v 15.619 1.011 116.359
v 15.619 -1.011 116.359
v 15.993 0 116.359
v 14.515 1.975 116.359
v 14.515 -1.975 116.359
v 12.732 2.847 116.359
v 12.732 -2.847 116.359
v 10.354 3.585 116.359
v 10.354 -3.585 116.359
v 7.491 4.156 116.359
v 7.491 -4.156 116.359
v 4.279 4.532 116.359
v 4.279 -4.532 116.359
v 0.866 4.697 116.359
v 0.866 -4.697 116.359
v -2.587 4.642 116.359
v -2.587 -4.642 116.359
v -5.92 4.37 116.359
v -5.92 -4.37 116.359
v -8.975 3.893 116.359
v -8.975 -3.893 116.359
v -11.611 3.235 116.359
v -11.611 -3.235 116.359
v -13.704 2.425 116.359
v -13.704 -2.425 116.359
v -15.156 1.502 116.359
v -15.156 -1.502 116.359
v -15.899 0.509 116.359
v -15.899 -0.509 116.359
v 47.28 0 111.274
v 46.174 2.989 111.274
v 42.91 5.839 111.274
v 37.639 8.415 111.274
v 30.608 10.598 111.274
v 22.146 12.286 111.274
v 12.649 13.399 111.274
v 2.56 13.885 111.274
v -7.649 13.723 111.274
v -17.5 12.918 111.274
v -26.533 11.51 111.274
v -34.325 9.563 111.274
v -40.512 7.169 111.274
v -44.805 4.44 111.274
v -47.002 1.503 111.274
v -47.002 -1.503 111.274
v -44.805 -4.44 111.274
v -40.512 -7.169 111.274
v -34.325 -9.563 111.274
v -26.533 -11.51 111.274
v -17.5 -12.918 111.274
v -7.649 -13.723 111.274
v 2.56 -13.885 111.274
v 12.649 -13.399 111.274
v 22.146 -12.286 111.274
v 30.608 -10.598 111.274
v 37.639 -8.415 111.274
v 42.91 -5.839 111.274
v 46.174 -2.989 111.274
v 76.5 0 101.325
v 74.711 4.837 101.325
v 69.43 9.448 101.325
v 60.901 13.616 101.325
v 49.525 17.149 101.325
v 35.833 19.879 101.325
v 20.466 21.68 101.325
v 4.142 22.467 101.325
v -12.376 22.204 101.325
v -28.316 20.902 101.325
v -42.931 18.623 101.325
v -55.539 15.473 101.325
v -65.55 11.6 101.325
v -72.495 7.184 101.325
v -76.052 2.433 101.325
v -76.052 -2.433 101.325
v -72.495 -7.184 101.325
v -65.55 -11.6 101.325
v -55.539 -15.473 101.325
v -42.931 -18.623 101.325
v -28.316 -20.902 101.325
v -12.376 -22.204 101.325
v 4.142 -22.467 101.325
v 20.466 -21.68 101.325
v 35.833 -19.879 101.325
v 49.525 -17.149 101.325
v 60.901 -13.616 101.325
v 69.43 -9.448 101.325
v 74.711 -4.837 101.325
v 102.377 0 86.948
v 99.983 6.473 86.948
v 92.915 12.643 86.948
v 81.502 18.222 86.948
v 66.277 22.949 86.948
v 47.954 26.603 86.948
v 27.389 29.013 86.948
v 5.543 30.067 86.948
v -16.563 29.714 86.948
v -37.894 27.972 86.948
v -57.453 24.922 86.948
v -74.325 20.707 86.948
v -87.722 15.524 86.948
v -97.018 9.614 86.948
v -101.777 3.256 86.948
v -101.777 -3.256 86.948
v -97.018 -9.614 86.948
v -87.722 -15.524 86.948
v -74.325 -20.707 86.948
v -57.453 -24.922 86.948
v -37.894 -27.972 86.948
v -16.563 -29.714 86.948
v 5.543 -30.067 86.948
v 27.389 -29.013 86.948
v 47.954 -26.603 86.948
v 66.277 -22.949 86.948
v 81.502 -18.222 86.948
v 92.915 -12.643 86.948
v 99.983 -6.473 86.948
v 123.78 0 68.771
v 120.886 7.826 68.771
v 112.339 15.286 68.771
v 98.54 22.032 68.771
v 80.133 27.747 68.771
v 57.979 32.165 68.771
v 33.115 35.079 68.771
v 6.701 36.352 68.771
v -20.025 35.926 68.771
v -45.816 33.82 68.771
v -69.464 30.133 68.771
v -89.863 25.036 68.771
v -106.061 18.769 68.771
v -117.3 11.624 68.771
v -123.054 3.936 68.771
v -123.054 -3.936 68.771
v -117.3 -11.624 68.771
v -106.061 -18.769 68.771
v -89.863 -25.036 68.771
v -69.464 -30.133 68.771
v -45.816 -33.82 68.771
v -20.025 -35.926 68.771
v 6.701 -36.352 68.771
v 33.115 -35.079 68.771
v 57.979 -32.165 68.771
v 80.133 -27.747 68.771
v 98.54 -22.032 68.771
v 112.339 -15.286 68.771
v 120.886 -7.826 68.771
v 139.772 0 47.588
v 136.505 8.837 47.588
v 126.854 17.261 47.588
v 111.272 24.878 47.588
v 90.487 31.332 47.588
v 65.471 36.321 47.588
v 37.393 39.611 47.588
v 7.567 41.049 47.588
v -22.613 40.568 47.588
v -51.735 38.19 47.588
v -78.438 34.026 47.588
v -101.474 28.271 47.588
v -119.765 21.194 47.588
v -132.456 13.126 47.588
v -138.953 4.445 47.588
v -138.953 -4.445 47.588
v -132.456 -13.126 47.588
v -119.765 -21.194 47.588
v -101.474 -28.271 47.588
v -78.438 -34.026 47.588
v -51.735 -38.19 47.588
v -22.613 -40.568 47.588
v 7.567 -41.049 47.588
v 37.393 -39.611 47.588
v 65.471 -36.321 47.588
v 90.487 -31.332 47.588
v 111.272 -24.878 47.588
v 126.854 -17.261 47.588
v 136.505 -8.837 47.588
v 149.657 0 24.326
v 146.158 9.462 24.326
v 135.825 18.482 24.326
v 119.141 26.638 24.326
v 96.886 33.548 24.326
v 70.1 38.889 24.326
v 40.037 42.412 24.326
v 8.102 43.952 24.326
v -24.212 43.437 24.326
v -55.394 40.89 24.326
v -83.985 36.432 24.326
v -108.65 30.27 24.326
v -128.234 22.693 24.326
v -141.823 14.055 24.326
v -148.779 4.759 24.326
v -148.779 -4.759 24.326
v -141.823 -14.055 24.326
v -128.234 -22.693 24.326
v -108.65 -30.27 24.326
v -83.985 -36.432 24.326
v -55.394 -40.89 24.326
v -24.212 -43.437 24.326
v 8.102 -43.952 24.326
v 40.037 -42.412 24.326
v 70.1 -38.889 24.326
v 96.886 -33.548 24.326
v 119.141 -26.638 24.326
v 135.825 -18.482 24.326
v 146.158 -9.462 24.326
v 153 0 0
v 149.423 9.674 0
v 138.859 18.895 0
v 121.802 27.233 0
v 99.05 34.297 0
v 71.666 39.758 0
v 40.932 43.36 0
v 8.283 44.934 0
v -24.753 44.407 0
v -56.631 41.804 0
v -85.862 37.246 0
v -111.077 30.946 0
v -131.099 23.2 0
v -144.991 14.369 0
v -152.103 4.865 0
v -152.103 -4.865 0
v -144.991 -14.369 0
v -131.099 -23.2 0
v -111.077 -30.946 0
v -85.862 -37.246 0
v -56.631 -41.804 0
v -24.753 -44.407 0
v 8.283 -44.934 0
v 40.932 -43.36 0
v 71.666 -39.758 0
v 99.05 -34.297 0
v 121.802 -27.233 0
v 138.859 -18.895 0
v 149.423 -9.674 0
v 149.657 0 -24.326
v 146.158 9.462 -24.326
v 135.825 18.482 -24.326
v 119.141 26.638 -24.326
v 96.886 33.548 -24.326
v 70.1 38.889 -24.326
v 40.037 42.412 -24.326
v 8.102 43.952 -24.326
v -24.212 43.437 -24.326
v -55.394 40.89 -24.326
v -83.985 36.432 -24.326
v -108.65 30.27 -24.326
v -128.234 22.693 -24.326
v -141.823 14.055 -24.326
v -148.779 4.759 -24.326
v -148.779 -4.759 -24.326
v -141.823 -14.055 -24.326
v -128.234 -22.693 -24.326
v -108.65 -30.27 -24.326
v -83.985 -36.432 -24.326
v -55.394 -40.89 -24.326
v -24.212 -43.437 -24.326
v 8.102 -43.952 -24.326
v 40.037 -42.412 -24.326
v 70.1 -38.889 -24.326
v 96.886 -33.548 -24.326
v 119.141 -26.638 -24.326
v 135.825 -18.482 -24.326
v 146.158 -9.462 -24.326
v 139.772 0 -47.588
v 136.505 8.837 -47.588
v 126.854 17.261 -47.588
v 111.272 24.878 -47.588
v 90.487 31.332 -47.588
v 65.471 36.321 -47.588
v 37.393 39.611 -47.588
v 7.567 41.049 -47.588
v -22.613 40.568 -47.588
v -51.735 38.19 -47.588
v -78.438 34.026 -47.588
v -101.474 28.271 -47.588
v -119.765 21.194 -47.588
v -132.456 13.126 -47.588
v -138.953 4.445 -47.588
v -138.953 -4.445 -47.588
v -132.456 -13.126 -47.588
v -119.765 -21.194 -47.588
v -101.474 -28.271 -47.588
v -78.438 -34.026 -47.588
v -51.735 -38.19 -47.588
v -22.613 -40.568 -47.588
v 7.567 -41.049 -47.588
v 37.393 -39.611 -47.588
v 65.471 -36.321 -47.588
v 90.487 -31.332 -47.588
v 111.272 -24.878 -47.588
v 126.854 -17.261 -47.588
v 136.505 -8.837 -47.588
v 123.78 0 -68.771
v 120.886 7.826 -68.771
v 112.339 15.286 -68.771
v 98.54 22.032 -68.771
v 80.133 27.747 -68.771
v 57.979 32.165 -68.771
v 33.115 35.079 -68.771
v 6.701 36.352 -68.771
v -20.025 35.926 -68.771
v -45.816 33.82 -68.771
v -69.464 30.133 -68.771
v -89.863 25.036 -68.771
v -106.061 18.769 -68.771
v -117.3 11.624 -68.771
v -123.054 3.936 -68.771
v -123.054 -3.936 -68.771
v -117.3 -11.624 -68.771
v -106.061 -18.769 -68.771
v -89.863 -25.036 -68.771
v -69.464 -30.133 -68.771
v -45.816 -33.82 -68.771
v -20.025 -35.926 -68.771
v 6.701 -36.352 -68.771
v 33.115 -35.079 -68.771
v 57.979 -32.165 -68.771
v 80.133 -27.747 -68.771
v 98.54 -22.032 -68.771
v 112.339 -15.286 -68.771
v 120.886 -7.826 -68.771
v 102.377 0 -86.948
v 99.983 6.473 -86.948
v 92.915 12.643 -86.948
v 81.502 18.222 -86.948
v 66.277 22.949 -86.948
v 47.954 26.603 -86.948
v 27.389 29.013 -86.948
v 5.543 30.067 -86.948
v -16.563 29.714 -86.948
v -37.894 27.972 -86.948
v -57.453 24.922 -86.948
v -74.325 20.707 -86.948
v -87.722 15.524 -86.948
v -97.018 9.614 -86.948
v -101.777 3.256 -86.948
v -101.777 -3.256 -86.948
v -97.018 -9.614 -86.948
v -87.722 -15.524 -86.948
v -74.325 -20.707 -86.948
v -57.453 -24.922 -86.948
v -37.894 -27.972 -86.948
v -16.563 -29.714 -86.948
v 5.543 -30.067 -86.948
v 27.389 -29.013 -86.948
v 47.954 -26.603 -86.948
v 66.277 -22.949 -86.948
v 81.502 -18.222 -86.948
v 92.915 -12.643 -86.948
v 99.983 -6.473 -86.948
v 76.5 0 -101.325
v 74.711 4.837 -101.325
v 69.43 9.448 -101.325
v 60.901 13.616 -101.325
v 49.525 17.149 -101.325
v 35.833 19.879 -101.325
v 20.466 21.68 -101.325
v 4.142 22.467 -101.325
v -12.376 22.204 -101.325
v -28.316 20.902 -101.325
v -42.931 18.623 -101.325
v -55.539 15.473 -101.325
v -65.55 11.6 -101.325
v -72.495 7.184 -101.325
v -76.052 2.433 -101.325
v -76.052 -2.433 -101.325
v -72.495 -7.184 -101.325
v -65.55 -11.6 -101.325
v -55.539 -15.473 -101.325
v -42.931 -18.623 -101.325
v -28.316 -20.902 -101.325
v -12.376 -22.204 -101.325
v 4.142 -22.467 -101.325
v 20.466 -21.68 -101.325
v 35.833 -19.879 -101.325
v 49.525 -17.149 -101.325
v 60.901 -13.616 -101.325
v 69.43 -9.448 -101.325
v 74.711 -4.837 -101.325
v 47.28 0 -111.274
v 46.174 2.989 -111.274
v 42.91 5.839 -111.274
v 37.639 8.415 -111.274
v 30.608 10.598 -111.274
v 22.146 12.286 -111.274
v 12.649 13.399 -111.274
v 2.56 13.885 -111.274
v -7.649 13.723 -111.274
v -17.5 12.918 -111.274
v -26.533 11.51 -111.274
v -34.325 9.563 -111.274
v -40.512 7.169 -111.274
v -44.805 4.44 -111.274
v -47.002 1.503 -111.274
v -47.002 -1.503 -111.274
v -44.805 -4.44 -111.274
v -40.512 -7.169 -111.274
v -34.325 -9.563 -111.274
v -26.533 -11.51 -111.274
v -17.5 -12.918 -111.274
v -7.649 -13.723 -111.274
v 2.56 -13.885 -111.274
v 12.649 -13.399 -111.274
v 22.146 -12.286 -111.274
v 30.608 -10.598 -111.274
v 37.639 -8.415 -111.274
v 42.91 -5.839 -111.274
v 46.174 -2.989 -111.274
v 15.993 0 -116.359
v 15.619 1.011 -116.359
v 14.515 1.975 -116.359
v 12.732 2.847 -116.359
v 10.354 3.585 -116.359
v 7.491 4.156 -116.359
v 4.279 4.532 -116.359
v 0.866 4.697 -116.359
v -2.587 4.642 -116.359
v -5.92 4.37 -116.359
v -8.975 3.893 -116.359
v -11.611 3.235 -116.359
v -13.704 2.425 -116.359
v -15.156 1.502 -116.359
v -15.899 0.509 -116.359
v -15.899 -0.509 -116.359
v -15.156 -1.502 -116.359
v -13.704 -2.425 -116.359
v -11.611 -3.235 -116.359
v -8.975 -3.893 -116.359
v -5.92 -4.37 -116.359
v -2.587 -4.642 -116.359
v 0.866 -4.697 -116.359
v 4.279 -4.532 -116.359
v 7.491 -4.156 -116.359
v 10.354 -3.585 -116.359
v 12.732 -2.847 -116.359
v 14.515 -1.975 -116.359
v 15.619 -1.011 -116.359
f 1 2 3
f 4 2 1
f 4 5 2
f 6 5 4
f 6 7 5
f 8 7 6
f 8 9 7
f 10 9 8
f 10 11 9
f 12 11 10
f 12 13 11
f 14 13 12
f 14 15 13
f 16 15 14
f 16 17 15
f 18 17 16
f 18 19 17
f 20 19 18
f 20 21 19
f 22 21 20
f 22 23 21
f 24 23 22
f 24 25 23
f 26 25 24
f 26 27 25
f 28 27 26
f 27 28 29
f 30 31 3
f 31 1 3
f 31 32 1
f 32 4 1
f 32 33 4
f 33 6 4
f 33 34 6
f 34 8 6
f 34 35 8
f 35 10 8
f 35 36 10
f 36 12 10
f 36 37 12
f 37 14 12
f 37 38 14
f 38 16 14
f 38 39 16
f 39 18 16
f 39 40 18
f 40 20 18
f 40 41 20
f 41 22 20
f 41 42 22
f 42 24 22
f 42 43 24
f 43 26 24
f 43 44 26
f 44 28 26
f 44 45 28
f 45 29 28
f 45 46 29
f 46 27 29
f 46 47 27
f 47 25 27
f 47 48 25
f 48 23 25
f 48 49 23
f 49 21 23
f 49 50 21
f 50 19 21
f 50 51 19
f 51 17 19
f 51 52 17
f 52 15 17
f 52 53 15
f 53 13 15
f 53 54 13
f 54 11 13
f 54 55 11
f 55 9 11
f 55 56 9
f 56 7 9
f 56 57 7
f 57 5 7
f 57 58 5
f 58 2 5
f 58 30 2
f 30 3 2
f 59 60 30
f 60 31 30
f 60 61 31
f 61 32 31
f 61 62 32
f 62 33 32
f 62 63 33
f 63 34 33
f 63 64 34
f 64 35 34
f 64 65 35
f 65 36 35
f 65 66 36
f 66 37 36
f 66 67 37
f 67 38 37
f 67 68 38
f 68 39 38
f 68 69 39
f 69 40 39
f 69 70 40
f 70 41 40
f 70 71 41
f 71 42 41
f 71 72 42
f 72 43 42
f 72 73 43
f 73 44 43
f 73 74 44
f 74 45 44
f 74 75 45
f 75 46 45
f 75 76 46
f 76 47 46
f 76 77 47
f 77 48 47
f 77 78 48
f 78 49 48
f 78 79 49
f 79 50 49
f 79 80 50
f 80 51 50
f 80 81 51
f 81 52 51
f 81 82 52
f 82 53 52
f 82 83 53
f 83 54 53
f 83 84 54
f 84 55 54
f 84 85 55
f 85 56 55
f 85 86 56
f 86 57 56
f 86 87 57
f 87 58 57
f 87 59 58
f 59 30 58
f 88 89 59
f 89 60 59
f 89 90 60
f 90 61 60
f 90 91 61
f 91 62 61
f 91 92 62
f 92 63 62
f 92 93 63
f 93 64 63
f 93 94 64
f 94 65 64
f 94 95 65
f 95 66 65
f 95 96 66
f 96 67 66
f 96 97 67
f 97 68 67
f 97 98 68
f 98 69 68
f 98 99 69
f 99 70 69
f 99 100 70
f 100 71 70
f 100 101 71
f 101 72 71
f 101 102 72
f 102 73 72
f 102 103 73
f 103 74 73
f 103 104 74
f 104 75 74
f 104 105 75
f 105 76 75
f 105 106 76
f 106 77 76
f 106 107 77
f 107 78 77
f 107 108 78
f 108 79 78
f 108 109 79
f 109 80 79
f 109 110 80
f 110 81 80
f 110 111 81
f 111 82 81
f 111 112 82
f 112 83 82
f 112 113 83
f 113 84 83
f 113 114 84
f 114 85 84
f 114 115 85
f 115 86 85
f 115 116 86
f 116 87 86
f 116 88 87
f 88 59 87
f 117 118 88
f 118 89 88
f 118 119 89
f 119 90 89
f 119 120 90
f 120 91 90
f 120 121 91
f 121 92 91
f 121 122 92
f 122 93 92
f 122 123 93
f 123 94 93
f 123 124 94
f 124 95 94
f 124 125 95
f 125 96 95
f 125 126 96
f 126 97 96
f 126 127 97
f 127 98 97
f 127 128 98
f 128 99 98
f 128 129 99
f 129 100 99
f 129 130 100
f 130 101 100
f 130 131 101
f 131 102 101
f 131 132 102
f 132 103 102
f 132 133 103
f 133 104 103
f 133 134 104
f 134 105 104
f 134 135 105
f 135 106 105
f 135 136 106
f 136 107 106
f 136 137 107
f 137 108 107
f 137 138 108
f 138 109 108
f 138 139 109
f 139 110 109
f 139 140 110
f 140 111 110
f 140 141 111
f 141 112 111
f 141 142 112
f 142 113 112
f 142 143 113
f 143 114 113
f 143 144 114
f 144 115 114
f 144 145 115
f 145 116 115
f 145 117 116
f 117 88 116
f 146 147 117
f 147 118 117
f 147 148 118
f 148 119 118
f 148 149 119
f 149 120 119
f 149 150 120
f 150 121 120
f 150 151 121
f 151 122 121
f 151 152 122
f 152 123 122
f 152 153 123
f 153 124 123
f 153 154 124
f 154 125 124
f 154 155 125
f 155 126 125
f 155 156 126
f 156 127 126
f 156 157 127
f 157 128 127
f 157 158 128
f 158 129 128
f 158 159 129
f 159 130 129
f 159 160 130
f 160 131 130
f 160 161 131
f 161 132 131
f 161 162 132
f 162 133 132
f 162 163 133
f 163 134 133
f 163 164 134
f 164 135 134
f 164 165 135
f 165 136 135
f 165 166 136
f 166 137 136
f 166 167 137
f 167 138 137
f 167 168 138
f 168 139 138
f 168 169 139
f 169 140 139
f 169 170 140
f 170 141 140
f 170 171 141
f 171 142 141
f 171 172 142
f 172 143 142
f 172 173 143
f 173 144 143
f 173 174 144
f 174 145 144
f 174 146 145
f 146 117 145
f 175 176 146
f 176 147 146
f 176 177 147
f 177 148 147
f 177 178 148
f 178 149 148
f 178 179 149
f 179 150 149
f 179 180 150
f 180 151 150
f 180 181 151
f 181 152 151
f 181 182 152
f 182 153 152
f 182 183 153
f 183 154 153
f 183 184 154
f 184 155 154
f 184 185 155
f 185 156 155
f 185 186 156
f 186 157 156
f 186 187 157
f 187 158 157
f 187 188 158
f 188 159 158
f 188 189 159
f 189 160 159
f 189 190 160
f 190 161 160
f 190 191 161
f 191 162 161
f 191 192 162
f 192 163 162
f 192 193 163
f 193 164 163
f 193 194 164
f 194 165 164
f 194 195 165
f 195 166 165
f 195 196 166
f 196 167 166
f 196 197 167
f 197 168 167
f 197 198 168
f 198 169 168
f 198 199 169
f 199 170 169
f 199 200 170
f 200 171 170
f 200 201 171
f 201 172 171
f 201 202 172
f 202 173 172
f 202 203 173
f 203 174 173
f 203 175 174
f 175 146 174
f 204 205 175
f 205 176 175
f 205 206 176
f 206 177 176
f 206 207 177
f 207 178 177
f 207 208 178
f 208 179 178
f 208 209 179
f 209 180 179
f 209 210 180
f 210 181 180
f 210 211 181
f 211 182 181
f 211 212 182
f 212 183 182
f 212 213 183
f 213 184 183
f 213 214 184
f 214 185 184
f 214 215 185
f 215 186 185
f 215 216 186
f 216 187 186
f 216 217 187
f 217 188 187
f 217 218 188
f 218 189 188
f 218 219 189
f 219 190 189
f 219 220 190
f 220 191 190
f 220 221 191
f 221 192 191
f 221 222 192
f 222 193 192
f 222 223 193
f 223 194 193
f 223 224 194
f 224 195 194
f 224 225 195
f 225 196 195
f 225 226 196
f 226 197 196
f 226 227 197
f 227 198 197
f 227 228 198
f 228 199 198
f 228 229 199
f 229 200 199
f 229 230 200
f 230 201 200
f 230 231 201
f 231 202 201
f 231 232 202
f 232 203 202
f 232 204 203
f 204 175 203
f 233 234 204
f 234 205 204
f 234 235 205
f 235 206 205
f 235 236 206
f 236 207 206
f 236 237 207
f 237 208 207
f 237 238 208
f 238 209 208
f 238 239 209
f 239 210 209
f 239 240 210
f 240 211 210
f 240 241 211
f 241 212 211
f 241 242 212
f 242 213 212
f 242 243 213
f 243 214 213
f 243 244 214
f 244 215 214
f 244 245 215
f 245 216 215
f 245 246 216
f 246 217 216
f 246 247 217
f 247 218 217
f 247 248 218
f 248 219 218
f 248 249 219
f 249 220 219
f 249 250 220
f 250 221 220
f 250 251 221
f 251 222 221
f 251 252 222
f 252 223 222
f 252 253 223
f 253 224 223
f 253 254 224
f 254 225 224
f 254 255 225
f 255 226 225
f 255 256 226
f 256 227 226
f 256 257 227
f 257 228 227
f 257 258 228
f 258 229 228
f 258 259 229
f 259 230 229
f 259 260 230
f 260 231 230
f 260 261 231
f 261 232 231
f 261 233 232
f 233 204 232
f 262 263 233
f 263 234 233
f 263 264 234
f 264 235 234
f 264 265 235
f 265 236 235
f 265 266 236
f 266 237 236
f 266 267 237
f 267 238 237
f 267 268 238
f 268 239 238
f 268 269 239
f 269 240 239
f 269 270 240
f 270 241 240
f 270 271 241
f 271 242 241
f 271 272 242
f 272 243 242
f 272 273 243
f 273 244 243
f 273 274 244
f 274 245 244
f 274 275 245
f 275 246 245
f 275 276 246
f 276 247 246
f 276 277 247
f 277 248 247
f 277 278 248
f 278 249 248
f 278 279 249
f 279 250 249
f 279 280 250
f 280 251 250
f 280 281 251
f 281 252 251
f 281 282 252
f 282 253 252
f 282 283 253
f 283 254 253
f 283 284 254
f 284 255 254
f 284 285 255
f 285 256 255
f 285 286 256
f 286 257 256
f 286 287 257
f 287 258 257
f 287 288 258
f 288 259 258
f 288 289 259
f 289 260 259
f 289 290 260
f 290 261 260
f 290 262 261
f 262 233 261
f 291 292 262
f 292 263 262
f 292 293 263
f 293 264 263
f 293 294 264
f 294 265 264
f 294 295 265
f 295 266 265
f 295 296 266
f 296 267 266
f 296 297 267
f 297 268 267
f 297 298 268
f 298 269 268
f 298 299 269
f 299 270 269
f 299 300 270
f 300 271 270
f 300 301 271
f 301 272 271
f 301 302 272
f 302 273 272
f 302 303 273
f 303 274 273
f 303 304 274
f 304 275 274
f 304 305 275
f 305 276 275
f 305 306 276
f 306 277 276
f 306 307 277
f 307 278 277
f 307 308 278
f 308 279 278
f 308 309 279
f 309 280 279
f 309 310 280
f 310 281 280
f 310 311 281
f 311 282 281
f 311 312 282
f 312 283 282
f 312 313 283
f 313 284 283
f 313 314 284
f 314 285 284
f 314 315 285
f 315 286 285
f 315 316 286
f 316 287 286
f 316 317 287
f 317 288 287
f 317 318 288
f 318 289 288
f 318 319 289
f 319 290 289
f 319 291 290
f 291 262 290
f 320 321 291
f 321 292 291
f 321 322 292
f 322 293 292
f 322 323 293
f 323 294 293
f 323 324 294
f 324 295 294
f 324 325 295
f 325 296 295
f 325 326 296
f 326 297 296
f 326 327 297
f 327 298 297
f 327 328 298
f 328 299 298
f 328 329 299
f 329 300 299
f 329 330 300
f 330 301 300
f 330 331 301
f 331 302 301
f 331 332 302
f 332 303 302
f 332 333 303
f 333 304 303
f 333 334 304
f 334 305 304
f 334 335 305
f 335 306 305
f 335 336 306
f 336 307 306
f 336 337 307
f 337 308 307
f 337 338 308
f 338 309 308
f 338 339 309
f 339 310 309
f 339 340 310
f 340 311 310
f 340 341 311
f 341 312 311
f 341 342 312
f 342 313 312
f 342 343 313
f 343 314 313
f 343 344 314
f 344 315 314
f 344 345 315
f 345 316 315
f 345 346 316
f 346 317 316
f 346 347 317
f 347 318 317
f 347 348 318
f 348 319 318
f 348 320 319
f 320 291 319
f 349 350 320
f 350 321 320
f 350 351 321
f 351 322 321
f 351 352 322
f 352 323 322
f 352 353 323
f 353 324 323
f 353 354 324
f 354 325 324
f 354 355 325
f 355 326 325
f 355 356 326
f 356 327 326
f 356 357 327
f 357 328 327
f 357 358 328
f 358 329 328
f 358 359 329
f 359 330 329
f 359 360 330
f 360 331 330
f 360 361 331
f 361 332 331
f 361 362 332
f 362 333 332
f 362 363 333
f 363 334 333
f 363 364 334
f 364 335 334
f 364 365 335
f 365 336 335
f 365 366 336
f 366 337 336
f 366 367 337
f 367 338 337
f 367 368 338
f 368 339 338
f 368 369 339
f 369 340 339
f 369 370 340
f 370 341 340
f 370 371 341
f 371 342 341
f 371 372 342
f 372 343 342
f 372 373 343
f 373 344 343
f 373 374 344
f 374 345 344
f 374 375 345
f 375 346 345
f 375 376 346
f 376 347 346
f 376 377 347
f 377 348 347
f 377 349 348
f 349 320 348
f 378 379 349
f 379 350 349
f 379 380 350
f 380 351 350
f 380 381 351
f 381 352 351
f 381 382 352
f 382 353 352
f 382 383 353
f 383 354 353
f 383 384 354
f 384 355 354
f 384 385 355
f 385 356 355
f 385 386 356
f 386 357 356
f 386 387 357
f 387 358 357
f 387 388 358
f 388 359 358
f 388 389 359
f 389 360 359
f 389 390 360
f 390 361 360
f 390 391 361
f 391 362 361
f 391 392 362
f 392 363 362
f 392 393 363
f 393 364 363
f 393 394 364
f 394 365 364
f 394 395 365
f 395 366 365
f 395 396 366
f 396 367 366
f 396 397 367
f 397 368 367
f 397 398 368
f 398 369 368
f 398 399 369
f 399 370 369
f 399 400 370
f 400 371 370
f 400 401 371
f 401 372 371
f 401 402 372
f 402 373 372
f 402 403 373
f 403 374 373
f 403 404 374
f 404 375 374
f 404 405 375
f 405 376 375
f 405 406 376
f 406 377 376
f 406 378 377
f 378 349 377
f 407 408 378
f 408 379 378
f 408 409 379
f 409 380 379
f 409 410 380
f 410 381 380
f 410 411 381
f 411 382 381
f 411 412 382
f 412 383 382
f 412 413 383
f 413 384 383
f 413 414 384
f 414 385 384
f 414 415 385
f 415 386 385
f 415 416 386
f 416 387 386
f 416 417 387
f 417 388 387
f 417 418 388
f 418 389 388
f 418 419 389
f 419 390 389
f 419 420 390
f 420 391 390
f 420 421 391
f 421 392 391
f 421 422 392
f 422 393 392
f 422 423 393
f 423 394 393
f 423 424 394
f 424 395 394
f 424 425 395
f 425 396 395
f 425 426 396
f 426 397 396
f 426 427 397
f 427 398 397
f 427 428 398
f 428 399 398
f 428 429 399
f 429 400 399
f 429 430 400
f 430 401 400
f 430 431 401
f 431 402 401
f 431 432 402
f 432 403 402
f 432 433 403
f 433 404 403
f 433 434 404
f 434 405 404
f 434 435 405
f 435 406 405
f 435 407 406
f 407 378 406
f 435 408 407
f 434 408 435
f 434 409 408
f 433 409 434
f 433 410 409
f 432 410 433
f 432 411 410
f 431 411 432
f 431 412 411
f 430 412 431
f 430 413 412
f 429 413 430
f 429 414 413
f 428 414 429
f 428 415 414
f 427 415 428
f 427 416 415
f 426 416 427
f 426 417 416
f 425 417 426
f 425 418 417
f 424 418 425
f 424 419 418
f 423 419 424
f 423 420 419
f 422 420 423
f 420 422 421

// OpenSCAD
// Generated by SolidPython 1.0.1 on 2020-07-29 00:46:52


scale(v = [17, 5, 13]) {
	sphere(r = 9);
}
/***********************************************
*********      SolidPython code:      **********
************************************************
 
# import packages: SolidPython
from solid import *
from solid.utils import *
from itertools import chain, combinations, permutations


class Resize:

    def __init__(self, scad_file):
        self.scad_file = scad_file
        #self.scad_file = import_scad(scad_file)
        # cone/cylinder param:
        self.r1 = 0
        self.r2 = 0
        self.h = 0
        # rectangular prism param:
        self.w = 0
        self.l = 0
        # ellipse param:
        self.r = 0

    # import OpenScad code (file name corresponds to shape)


    # classify shape + parameters
    def assign(self, param1, param2, param3):
        if self.scad_file == 'cone.scad':
            self.r1 = param1
            self.r2 = param2
            self.h = param3
        elif self.scad_file == 'cylinder.scad':
            self.r1 = param1
            self.r2 = param2
            self.h = param3
        elif self.scad_file == 'rectangularPrism.scad':
            self.h = param1
            self.l = param2
            self.w = param3
        else:
            self.r = param1
            self.h = param2

    # resize parameters
    def iterate(self):
        x = range(3, 20, 2)
        i = 1
        if self.scad_file == 'cone.scad':
            tempList = list(permutations(x, 2))
            for temp in tempList:
                param1 = temp[0]
                param2 = temp[1]
                filepath = 'produced_scad_files/' + 'cone' + str(param1) + '_' + str(param2) + '_' + '.scad'
                scad_render_to_file(cylinder(h=param1, r1=param2, r2=0), filepath)

        elif self.scad_file == 'cylinder.scad':
            tempList = list(permutations(x, 3))
            for temp in tempList:
                param1 = temp[0]
                param2 = temp[1]
                filepath = 'produced_scad_files/' + 'cylinder' + str(param1) + '_' + str(param2) + '_' + '.scad'
                scad_render_to_file(cylinder(h=param1, r1=param2, r2=param2), filepath)

        elif self.scad_file == 'rectangularPrism.scad':
            tempList = list(permutations(x, 3))
            for temp in tempList:
                param1 = temp[0]
                param2 = temp[1]
                param3 = temp[2]
                filepath = 'produced_scad_files/' + 'rectangularPrism' + str(param1) + '_' + str(param2) + '_' + str(
                    param3) + '.scad'
                scad_render_to_file(cube(size=(param1, param2, param3)), filepath)

        elif self.scad_file == 'ellipse.scad':
            tempList = list(permutations(x, 4))
            for temp in tempList:
                param1 = temp[0]
                param2 = temp[1]
                param3 = temp[2]
                param4 = temp[3]
                filepath = 'produced_scad_files/' + 'ellipse' + str(param1) + '_' + str(param2) + '_' + str(param3) + '_' + str(param4) + '.scad'
                scad_render_to_file(scale([param1, param2, param3])(sphere(r=param4)), filepath)

    def render_to_scadfile(self):
        scad_render_to_file(scad, 'example.scad') 
 
************************************************/
